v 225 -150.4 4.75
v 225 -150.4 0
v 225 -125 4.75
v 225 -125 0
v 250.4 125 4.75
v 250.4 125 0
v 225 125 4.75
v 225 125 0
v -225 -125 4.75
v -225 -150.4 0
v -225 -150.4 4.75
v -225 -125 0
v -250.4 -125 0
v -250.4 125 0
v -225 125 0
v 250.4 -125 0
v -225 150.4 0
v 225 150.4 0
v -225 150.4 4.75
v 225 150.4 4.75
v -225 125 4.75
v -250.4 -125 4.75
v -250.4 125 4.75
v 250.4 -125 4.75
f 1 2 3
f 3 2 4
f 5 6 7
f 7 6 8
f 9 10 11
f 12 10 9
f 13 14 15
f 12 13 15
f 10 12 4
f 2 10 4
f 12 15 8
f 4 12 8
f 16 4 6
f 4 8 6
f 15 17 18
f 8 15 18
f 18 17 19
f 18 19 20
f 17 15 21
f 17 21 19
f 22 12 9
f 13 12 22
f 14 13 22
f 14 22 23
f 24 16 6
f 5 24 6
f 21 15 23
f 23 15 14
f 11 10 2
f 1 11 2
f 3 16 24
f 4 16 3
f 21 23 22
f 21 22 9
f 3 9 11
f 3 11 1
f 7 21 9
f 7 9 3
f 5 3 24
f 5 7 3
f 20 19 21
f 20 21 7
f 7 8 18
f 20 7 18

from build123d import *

# Parameters (mm, degrees)
SKETCH_1_W          = 500.8
SKETCH_1_H          = 300.8
EXTRUDE_1_DEPTH     = 4.75
SKETCH_2_W          = 25.4
SKETCH_2_H          = 25.4
CUT_EXTRUDE_1_DEPTH = 10


with BuildPart() as part:
    # 草圖1 → 填料-伸長1 (new body)
    with BuildSketch(Plane.XY):
        Rectangle(SKETCH_1_W, SKETCH_1_H)
    extrude(amount=EXTRUDE_1_DEPTH)

    # 草圖2 → 除料-伸長1 (cut)
    with BuildSketch(Plane(origin=(0, 0, 0), x_dir=(-1, 0, 0), z_dir=(0, 0, -1))):
        with Locations((-237.7, 137.7)):
            Rectangle(SKETCH_2_W, SKETCH_2_H)
        with Locations((-237.7, -137.7)):
            Rectangle(SKETCH_2_W, SKETCH_2_H)
        with Locations((237.7, 137.7)):
            Rectangle(SKETCH_2_W, SKETCH_2_H)
        with Locations((237.7, -137.7)):
            Rectangle(SKETCH_2_W, SKETCH_2_H)
    extrude(amount=-CUT_EXTRUDE_1_DEPTH, mode=Mode.SUBTRACT)


solid = part.part
